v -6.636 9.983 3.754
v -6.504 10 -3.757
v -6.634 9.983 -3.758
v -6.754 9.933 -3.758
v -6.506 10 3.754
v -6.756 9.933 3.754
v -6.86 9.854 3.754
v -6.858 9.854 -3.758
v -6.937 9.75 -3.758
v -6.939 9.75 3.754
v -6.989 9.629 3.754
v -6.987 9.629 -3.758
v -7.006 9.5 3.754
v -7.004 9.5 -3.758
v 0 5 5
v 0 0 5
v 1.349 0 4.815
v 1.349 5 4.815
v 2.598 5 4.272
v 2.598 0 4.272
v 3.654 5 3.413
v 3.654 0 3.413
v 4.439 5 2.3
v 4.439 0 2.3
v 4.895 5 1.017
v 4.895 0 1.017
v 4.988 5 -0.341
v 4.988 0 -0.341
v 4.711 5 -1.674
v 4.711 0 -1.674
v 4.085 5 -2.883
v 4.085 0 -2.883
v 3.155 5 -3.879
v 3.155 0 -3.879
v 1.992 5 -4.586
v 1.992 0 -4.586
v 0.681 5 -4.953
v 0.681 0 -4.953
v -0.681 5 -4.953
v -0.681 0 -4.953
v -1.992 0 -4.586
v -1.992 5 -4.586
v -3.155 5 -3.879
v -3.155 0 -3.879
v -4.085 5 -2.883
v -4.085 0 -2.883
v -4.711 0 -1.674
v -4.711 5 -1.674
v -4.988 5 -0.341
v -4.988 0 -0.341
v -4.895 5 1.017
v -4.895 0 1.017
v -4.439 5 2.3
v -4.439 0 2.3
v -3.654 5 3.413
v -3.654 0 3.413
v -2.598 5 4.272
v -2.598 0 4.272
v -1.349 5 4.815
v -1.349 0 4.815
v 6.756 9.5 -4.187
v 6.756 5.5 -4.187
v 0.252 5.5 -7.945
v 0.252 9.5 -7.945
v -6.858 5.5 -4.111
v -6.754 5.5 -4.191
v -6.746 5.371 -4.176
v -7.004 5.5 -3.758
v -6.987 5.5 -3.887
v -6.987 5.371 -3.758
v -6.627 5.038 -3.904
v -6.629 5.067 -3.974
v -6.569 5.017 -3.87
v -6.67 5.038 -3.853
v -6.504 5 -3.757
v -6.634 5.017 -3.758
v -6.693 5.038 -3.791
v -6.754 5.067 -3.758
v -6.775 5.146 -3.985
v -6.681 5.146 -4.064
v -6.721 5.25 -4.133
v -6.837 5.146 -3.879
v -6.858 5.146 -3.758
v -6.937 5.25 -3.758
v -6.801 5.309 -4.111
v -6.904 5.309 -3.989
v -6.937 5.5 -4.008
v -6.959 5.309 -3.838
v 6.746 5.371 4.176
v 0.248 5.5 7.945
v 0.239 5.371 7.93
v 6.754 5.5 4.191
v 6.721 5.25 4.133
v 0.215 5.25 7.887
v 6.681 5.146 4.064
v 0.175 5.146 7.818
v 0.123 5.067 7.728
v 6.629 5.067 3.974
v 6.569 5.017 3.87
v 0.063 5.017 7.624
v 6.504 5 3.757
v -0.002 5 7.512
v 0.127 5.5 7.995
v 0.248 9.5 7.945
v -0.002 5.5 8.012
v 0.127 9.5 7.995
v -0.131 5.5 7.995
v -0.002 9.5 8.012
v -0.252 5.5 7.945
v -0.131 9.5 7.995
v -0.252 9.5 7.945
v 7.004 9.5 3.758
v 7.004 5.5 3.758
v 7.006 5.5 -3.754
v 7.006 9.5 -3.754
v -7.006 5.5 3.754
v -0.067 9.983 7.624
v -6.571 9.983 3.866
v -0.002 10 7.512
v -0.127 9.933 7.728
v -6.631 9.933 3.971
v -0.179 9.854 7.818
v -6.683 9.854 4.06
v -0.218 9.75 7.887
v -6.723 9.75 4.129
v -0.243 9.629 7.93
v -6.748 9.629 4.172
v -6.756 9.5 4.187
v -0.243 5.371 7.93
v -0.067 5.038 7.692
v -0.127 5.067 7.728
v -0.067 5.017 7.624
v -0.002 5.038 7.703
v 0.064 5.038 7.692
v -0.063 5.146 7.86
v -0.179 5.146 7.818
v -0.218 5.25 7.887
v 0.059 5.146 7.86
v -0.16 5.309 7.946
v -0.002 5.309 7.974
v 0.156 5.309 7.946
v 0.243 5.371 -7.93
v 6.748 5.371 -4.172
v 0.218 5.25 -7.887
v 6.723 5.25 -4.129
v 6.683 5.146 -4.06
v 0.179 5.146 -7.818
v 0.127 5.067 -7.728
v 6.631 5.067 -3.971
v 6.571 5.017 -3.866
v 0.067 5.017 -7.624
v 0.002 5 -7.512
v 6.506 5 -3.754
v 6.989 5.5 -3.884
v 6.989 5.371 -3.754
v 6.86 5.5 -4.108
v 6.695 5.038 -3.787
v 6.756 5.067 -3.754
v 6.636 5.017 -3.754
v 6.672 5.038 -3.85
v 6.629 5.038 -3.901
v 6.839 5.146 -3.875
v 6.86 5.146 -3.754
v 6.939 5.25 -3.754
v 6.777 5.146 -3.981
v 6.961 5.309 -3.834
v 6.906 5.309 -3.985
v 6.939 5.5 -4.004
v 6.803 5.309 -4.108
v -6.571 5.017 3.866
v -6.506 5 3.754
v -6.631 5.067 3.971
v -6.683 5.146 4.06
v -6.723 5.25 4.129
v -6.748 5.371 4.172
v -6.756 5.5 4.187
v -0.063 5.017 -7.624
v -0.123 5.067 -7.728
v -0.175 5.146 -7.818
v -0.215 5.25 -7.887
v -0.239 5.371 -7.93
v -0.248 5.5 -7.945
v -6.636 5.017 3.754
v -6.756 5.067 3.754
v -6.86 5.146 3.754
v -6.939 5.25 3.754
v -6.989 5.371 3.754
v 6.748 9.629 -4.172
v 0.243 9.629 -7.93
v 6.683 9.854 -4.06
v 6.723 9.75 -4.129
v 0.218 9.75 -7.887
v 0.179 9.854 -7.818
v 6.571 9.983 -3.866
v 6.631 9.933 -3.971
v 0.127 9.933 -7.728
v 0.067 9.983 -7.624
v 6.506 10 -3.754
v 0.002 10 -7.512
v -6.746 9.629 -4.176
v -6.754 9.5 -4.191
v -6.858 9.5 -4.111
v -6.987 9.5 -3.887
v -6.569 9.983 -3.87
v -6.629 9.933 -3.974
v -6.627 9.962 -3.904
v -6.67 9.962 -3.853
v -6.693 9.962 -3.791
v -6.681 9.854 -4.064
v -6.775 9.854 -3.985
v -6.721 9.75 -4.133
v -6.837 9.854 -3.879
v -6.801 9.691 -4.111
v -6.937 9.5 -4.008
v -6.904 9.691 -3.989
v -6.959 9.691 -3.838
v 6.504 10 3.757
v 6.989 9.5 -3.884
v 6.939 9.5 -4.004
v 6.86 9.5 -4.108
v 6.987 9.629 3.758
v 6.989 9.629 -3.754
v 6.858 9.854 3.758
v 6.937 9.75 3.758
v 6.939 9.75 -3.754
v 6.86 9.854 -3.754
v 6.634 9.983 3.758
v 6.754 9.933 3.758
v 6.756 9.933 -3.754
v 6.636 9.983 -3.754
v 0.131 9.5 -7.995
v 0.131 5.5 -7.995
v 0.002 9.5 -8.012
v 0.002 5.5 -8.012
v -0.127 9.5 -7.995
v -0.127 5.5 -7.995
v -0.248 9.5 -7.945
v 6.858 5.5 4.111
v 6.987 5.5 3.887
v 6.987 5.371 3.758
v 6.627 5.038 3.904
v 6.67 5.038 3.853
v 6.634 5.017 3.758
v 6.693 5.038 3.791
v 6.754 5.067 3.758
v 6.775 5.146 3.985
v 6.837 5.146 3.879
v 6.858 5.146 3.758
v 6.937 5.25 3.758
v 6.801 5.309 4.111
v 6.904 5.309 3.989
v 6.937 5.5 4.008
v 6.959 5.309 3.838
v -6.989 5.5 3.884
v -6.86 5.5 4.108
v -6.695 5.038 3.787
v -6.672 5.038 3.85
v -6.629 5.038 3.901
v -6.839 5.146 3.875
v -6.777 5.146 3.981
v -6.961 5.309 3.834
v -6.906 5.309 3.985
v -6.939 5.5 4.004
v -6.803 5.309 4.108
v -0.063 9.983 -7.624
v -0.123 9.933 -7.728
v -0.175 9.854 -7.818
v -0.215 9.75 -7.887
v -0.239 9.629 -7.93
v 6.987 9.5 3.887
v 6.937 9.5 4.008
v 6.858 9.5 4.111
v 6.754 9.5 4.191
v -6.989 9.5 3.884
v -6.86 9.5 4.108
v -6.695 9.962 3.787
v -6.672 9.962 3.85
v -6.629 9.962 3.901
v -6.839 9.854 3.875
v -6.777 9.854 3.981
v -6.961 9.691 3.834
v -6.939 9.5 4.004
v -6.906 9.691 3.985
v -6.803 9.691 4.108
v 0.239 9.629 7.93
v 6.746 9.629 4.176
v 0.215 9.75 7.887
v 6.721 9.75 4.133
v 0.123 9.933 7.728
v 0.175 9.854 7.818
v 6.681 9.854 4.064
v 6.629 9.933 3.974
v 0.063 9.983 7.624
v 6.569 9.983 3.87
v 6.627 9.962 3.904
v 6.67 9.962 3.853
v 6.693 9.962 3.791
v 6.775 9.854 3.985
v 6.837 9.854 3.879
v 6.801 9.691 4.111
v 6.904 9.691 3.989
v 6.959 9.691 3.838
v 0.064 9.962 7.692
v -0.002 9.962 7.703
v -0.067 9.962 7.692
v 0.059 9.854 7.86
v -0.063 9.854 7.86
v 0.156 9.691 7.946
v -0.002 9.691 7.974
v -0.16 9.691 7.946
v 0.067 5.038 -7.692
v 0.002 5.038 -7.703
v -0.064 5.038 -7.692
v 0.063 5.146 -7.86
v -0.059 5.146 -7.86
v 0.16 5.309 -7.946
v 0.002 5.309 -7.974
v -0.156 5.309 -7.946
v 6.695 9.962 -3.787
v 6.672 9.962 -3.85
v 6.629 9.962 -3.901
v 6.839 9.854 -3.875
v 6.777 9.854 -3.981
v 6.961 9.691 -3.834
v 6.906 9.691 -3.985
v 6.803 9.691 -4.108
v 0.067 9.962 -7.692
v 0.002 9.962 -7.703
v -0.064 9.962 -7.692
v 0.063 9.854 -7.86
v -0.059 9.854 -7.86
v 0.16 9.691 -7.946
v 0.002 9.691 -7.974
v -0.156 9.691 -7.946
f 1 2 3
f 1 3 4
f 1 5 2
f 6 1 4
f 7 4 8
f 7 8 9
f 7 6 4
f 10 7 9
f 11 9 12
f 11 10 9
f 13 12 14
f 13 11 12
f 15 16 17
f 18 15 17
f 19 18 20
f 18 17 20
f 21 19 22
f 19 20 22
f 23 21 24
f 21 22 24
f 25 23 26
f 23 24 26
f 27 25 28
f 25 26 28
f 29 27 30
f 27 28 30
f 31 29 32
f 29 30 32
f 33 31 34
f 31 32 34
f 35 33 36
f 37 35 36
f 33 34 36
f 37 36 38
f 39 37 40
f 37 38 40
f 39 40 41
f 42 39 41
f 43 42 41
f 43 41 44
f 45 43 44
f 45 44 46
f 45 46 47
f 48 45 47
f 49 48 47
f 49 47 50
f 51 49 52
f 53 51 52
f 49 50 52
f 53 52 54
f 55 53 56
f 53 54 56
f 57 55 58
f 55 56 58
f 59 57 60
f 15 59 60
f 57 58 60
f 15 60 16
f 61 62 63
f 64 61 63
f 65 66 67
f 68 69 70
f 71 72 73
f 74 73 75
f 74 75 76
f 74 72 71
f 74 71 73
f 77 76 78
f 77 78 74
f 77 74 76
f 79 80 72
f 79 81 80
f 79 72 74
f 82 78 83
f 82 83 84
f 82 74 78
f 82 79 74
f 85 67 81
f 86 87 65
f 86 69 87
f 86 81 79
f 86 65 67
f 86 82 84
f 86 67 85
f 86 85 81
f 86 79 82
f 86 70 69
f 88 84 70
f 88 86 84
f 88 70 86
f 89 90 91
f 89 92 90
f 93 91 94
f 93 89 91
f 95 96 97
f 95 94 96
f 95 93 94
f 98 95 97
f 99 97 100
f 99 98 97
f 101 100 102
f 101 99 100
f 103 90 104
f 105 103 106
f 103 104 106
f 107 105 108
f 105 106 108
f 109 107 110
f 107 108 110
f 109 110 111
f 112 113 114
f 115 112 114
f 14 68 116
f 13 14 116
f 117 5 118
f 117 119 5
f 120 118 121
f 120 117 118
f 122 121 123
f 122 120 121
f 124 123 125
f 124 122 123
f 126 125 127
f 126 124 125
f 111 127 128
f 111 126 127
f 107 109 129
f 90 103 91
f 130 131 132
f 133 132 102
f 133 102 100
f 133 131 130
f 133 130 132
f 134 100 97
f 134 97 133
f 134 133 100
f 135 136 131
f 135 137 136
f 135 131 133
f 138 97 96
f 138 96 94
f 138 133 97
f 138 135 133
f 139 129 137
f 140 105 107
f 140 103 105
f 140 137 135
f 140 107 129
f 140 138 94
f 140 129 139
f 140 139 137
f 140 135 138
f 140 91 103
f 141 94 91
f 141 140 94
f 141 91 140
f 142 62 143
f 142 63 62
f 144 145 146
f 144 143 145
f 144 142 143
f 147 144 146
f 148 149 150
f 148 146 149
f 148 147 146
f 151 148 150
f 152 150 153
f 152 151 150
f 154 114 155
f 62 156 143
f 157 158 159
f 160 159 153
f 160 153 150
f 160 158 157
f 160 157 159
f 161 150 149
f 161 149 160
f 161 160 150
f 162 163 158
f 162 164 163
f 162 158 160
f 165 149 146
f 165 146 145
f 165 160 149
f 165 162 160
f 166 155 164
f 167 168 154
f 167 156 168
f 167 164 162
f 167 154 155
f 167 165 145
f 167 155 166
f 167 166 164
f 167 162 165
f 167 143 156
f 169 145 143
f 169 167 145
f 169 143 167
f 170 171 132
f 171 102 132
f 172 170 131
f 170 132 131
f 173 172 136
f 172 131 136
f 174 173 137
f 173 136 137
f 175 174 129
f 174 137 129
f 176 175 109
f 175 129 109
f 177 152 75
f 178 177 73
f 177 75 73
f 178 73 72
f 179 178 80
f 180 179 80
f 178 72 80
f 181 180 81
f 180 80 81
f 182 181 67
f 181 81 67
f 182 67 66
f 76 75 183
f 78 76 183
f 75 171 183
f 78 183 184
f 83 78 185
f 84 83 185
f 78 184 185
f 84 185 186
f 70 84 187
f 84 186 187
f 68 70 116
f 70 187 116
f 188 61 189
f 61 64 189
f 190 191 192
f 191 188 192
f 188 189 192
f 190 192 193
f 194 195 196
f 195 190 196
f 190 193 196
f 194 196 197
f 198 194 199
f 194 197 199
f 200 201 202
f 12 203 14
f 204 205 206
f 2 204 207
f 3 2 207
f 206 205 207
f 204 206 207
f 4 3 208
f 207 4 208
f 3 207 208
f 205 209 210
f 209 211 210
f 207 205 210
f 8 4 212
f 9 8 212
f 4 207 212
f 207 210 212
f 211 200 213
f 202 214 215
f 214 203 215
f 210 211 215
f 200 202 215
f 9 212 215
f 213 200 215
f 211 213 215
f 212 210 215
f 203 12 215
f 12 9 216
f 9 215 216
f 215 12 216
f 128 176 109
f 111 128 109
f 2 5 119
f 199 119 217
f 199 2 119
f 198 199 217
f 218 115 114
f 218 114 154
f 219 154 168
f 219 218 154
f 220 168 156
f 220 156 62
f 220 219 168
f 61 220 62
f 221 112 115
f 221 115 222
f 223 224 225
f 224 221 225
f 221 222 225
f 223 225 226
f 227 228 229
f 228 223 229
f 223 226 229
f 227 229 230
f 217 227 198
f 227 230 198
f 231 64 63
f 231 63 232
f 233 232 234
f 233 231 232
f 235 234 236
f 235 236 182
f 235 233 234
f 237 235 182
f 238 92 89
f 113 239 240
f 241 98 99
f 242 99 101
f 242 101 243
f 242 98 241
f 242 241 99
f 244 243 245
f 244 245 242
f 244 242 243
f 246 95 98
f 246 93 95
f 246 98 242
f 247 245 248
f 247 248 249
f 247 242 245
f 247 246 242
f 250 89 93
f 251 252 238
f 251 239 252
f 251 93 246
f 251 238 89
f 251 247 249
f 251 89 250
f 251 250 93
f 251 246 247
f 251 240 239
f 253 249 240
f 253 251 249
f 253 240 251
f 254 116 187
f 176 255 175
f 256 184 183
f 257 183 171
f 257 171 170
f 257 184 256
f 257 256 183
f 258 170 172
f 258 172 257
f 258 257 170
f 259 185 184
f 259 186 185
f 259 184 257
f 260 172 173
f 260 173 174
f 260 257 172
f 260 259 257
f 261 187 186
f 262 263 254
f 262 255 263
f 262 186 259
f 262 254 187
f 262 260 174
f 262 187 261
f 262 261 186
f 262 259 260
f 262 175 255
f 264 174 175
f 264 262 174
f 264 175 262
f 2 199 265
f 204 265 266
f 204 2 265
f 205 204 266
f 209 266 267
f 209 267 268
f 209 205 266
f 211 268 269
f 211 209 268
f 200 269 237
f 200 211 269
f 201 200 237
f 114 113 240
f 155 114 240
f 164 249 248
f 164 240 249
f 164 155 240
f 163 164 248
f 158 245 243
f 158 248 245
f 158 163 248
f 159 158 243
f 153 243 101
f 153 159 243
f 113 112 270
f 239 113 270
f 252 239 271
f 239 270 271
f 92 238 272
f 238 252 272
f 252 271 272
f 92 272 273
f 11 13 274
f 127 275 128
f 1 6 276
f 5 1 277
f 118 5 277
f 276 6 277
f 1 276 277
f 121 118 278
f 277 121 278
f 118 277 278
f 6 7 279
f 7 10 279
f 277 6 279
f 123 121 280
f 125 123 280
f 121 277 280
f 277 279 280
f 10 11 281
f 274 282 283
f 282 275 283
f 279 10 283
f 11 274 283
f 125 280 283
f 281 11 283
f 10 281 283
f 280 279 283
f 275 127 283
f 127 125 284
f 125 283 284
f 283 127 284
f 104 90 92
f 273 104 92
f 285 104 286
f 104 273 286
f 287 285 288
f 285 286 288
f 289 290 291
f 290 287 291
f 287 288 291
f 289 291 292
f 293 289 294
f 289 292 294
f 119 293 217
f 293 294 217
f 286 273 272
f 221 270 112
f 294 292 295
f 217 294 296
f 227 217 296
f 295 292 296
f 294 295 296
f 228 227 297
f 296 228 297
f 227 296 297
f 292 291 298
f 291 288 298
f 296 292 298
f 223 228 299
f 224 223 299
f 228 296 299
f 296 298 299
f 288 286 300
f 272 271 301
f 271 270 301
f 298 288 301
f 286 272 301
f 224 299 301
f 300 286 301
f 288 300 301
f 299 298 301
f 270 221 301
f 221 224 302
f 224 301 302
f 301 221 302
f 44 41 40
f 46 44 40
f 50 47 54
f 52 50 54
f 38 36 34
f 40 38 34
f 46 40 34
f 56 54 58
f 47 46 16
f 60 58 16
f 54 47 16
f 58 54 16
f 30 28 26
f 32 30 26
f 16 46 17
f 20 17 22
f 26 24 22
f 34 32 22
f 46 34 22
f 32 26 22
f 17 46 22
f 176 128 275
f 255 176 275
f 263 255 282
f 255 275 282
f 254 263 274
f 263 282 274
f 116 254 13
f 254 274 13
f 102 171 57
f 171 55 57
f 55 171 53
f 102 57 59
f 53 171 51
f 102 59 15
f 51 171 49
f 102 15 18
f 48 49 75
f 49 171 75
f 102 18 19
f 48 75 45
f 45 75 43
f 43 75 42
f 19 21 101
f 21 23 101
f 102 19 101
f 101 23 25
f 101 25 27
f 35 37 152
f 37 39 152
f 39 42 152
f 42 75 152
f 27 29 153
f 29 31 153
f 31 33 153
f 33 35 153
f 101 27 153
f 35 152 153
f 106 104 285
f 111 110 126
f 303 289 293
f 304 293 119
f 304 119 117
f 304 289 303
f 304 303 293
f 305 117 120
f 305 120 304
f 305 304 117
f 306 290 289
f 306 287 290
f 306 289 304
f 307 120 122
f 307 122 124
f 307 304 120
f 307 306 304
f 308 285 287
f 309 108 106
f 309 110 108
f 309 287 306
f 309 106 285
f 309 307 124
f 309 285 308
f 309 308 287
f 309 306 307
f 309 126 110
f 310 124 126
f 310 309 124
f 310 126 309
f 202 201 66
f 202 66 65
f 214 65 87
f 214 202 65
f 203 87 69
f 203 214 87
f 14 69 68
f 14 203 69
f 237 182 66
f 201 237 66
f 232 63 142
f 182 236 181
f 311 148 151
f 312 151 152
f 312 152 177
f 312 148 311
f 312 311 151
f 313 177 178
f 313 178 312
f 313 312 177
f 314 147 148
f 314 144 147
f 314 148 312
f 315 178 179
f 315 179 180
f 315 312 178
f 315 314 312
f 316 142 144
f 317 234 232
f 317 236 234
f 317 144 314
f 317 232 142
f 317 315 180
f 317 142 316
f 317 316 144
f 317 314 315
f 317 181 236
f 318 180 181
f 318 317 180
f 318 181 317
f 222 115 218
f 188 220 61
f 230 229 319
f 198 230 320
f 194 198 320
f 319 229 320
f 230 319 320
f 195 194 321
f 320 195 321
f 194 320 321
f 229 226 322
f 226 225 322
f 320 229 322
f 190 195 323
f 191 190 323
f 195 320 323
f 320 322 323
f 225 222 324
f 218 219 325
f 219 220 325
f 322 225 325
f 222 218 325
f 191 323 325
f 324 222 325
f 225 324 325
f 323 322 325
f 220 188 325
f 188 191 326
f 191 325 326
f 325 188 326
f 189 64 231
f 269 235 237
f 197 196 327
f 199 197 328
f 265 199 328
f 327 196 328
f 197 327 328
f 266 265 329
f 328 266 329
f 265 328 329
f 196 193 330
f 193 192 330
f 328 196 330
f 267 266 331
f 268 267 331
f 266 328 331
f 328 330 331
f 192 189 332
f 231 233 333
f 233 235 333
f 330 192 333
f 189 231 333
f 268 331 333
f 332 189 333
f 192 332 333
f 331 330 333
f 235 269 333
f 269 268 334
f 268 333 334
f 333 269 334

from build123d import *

# Parameters (mm, degrees)
SKETCH1_R           = 5
BOSS_EXTRUDE1_DEPTH = 5
BOSS_EXTRUDE2_DEPTH = 5
FILLET1_R           = 0.5


with BuildPart() as part:
    # Sketch1 → Boss-Extrude1 (new body)
    with BuildSketch(Plane(origin=(0, 0, 0), x_dir=(1, 0, 0), z_dir=(0, 1, 0))):
        with Locations(Location((0, 0, 0), (0, 0, 270))):
            Circle(SKETCH1_R)
    extrude(amount=BOSS_EXTRUDE1_DEPTH)

    # Sketch2 → Boss-Extrude2 (add)
    with BuildSketch(Plane(origin=(0, 5, 0), x_dir=(1, 0, 0), z_dir=(0, 1, 0))):
        Polygon((7.004330674, -4.046297386), (7.006361665, 4.042779607), (0.002030991, 8.089076993), (-7.004330674, 4.046297386), (-7.006361665, -4.042779607), (-0.002030991, -8.089076993), align=None)
    extrude(amount=BOSS_EXTRUDE2_DEPTH)

    # Fillet1
    fillet1_edges = [part.edges().sort_by_distance(p)[0] for p in [
        (3.501149842, 5, 6.06768719),
        (-0.002030991, 7.5, 8.089076993),
        (7.00534617, 5, 0.00175889),
        (7.004330674, 7.5, 4.046297386),
        (3.504196328, 5, -6.0659283),
        (7.006361665, 7.5, -4.042779607),
        (-3.501149842, 5, -6.06768719),
        (0.002030991, 7.5, -8.089076993),
        (-7.00534617, 5, -0.00175889),
        (-7.004330674, 7.5, -4.046297386),
        (-3.504196328, 5, 6.0659283),
        (-7.006361665, 7.5, 4.042779607),
        (3.501149842, 10, 6.06768719),
        (7.00534617, 10, 0.00175889),
        (3.504196328, 10, -6.0659283),
        (-3.501149842, 10, -6.06768719),
        (-7.00534617, 10, -0.00175889),
        (-3.504196328, 10, 6.0659283),
    ]]
    fillet(fillet1_edges, radius=FILLET1_R)


solid = part.part
